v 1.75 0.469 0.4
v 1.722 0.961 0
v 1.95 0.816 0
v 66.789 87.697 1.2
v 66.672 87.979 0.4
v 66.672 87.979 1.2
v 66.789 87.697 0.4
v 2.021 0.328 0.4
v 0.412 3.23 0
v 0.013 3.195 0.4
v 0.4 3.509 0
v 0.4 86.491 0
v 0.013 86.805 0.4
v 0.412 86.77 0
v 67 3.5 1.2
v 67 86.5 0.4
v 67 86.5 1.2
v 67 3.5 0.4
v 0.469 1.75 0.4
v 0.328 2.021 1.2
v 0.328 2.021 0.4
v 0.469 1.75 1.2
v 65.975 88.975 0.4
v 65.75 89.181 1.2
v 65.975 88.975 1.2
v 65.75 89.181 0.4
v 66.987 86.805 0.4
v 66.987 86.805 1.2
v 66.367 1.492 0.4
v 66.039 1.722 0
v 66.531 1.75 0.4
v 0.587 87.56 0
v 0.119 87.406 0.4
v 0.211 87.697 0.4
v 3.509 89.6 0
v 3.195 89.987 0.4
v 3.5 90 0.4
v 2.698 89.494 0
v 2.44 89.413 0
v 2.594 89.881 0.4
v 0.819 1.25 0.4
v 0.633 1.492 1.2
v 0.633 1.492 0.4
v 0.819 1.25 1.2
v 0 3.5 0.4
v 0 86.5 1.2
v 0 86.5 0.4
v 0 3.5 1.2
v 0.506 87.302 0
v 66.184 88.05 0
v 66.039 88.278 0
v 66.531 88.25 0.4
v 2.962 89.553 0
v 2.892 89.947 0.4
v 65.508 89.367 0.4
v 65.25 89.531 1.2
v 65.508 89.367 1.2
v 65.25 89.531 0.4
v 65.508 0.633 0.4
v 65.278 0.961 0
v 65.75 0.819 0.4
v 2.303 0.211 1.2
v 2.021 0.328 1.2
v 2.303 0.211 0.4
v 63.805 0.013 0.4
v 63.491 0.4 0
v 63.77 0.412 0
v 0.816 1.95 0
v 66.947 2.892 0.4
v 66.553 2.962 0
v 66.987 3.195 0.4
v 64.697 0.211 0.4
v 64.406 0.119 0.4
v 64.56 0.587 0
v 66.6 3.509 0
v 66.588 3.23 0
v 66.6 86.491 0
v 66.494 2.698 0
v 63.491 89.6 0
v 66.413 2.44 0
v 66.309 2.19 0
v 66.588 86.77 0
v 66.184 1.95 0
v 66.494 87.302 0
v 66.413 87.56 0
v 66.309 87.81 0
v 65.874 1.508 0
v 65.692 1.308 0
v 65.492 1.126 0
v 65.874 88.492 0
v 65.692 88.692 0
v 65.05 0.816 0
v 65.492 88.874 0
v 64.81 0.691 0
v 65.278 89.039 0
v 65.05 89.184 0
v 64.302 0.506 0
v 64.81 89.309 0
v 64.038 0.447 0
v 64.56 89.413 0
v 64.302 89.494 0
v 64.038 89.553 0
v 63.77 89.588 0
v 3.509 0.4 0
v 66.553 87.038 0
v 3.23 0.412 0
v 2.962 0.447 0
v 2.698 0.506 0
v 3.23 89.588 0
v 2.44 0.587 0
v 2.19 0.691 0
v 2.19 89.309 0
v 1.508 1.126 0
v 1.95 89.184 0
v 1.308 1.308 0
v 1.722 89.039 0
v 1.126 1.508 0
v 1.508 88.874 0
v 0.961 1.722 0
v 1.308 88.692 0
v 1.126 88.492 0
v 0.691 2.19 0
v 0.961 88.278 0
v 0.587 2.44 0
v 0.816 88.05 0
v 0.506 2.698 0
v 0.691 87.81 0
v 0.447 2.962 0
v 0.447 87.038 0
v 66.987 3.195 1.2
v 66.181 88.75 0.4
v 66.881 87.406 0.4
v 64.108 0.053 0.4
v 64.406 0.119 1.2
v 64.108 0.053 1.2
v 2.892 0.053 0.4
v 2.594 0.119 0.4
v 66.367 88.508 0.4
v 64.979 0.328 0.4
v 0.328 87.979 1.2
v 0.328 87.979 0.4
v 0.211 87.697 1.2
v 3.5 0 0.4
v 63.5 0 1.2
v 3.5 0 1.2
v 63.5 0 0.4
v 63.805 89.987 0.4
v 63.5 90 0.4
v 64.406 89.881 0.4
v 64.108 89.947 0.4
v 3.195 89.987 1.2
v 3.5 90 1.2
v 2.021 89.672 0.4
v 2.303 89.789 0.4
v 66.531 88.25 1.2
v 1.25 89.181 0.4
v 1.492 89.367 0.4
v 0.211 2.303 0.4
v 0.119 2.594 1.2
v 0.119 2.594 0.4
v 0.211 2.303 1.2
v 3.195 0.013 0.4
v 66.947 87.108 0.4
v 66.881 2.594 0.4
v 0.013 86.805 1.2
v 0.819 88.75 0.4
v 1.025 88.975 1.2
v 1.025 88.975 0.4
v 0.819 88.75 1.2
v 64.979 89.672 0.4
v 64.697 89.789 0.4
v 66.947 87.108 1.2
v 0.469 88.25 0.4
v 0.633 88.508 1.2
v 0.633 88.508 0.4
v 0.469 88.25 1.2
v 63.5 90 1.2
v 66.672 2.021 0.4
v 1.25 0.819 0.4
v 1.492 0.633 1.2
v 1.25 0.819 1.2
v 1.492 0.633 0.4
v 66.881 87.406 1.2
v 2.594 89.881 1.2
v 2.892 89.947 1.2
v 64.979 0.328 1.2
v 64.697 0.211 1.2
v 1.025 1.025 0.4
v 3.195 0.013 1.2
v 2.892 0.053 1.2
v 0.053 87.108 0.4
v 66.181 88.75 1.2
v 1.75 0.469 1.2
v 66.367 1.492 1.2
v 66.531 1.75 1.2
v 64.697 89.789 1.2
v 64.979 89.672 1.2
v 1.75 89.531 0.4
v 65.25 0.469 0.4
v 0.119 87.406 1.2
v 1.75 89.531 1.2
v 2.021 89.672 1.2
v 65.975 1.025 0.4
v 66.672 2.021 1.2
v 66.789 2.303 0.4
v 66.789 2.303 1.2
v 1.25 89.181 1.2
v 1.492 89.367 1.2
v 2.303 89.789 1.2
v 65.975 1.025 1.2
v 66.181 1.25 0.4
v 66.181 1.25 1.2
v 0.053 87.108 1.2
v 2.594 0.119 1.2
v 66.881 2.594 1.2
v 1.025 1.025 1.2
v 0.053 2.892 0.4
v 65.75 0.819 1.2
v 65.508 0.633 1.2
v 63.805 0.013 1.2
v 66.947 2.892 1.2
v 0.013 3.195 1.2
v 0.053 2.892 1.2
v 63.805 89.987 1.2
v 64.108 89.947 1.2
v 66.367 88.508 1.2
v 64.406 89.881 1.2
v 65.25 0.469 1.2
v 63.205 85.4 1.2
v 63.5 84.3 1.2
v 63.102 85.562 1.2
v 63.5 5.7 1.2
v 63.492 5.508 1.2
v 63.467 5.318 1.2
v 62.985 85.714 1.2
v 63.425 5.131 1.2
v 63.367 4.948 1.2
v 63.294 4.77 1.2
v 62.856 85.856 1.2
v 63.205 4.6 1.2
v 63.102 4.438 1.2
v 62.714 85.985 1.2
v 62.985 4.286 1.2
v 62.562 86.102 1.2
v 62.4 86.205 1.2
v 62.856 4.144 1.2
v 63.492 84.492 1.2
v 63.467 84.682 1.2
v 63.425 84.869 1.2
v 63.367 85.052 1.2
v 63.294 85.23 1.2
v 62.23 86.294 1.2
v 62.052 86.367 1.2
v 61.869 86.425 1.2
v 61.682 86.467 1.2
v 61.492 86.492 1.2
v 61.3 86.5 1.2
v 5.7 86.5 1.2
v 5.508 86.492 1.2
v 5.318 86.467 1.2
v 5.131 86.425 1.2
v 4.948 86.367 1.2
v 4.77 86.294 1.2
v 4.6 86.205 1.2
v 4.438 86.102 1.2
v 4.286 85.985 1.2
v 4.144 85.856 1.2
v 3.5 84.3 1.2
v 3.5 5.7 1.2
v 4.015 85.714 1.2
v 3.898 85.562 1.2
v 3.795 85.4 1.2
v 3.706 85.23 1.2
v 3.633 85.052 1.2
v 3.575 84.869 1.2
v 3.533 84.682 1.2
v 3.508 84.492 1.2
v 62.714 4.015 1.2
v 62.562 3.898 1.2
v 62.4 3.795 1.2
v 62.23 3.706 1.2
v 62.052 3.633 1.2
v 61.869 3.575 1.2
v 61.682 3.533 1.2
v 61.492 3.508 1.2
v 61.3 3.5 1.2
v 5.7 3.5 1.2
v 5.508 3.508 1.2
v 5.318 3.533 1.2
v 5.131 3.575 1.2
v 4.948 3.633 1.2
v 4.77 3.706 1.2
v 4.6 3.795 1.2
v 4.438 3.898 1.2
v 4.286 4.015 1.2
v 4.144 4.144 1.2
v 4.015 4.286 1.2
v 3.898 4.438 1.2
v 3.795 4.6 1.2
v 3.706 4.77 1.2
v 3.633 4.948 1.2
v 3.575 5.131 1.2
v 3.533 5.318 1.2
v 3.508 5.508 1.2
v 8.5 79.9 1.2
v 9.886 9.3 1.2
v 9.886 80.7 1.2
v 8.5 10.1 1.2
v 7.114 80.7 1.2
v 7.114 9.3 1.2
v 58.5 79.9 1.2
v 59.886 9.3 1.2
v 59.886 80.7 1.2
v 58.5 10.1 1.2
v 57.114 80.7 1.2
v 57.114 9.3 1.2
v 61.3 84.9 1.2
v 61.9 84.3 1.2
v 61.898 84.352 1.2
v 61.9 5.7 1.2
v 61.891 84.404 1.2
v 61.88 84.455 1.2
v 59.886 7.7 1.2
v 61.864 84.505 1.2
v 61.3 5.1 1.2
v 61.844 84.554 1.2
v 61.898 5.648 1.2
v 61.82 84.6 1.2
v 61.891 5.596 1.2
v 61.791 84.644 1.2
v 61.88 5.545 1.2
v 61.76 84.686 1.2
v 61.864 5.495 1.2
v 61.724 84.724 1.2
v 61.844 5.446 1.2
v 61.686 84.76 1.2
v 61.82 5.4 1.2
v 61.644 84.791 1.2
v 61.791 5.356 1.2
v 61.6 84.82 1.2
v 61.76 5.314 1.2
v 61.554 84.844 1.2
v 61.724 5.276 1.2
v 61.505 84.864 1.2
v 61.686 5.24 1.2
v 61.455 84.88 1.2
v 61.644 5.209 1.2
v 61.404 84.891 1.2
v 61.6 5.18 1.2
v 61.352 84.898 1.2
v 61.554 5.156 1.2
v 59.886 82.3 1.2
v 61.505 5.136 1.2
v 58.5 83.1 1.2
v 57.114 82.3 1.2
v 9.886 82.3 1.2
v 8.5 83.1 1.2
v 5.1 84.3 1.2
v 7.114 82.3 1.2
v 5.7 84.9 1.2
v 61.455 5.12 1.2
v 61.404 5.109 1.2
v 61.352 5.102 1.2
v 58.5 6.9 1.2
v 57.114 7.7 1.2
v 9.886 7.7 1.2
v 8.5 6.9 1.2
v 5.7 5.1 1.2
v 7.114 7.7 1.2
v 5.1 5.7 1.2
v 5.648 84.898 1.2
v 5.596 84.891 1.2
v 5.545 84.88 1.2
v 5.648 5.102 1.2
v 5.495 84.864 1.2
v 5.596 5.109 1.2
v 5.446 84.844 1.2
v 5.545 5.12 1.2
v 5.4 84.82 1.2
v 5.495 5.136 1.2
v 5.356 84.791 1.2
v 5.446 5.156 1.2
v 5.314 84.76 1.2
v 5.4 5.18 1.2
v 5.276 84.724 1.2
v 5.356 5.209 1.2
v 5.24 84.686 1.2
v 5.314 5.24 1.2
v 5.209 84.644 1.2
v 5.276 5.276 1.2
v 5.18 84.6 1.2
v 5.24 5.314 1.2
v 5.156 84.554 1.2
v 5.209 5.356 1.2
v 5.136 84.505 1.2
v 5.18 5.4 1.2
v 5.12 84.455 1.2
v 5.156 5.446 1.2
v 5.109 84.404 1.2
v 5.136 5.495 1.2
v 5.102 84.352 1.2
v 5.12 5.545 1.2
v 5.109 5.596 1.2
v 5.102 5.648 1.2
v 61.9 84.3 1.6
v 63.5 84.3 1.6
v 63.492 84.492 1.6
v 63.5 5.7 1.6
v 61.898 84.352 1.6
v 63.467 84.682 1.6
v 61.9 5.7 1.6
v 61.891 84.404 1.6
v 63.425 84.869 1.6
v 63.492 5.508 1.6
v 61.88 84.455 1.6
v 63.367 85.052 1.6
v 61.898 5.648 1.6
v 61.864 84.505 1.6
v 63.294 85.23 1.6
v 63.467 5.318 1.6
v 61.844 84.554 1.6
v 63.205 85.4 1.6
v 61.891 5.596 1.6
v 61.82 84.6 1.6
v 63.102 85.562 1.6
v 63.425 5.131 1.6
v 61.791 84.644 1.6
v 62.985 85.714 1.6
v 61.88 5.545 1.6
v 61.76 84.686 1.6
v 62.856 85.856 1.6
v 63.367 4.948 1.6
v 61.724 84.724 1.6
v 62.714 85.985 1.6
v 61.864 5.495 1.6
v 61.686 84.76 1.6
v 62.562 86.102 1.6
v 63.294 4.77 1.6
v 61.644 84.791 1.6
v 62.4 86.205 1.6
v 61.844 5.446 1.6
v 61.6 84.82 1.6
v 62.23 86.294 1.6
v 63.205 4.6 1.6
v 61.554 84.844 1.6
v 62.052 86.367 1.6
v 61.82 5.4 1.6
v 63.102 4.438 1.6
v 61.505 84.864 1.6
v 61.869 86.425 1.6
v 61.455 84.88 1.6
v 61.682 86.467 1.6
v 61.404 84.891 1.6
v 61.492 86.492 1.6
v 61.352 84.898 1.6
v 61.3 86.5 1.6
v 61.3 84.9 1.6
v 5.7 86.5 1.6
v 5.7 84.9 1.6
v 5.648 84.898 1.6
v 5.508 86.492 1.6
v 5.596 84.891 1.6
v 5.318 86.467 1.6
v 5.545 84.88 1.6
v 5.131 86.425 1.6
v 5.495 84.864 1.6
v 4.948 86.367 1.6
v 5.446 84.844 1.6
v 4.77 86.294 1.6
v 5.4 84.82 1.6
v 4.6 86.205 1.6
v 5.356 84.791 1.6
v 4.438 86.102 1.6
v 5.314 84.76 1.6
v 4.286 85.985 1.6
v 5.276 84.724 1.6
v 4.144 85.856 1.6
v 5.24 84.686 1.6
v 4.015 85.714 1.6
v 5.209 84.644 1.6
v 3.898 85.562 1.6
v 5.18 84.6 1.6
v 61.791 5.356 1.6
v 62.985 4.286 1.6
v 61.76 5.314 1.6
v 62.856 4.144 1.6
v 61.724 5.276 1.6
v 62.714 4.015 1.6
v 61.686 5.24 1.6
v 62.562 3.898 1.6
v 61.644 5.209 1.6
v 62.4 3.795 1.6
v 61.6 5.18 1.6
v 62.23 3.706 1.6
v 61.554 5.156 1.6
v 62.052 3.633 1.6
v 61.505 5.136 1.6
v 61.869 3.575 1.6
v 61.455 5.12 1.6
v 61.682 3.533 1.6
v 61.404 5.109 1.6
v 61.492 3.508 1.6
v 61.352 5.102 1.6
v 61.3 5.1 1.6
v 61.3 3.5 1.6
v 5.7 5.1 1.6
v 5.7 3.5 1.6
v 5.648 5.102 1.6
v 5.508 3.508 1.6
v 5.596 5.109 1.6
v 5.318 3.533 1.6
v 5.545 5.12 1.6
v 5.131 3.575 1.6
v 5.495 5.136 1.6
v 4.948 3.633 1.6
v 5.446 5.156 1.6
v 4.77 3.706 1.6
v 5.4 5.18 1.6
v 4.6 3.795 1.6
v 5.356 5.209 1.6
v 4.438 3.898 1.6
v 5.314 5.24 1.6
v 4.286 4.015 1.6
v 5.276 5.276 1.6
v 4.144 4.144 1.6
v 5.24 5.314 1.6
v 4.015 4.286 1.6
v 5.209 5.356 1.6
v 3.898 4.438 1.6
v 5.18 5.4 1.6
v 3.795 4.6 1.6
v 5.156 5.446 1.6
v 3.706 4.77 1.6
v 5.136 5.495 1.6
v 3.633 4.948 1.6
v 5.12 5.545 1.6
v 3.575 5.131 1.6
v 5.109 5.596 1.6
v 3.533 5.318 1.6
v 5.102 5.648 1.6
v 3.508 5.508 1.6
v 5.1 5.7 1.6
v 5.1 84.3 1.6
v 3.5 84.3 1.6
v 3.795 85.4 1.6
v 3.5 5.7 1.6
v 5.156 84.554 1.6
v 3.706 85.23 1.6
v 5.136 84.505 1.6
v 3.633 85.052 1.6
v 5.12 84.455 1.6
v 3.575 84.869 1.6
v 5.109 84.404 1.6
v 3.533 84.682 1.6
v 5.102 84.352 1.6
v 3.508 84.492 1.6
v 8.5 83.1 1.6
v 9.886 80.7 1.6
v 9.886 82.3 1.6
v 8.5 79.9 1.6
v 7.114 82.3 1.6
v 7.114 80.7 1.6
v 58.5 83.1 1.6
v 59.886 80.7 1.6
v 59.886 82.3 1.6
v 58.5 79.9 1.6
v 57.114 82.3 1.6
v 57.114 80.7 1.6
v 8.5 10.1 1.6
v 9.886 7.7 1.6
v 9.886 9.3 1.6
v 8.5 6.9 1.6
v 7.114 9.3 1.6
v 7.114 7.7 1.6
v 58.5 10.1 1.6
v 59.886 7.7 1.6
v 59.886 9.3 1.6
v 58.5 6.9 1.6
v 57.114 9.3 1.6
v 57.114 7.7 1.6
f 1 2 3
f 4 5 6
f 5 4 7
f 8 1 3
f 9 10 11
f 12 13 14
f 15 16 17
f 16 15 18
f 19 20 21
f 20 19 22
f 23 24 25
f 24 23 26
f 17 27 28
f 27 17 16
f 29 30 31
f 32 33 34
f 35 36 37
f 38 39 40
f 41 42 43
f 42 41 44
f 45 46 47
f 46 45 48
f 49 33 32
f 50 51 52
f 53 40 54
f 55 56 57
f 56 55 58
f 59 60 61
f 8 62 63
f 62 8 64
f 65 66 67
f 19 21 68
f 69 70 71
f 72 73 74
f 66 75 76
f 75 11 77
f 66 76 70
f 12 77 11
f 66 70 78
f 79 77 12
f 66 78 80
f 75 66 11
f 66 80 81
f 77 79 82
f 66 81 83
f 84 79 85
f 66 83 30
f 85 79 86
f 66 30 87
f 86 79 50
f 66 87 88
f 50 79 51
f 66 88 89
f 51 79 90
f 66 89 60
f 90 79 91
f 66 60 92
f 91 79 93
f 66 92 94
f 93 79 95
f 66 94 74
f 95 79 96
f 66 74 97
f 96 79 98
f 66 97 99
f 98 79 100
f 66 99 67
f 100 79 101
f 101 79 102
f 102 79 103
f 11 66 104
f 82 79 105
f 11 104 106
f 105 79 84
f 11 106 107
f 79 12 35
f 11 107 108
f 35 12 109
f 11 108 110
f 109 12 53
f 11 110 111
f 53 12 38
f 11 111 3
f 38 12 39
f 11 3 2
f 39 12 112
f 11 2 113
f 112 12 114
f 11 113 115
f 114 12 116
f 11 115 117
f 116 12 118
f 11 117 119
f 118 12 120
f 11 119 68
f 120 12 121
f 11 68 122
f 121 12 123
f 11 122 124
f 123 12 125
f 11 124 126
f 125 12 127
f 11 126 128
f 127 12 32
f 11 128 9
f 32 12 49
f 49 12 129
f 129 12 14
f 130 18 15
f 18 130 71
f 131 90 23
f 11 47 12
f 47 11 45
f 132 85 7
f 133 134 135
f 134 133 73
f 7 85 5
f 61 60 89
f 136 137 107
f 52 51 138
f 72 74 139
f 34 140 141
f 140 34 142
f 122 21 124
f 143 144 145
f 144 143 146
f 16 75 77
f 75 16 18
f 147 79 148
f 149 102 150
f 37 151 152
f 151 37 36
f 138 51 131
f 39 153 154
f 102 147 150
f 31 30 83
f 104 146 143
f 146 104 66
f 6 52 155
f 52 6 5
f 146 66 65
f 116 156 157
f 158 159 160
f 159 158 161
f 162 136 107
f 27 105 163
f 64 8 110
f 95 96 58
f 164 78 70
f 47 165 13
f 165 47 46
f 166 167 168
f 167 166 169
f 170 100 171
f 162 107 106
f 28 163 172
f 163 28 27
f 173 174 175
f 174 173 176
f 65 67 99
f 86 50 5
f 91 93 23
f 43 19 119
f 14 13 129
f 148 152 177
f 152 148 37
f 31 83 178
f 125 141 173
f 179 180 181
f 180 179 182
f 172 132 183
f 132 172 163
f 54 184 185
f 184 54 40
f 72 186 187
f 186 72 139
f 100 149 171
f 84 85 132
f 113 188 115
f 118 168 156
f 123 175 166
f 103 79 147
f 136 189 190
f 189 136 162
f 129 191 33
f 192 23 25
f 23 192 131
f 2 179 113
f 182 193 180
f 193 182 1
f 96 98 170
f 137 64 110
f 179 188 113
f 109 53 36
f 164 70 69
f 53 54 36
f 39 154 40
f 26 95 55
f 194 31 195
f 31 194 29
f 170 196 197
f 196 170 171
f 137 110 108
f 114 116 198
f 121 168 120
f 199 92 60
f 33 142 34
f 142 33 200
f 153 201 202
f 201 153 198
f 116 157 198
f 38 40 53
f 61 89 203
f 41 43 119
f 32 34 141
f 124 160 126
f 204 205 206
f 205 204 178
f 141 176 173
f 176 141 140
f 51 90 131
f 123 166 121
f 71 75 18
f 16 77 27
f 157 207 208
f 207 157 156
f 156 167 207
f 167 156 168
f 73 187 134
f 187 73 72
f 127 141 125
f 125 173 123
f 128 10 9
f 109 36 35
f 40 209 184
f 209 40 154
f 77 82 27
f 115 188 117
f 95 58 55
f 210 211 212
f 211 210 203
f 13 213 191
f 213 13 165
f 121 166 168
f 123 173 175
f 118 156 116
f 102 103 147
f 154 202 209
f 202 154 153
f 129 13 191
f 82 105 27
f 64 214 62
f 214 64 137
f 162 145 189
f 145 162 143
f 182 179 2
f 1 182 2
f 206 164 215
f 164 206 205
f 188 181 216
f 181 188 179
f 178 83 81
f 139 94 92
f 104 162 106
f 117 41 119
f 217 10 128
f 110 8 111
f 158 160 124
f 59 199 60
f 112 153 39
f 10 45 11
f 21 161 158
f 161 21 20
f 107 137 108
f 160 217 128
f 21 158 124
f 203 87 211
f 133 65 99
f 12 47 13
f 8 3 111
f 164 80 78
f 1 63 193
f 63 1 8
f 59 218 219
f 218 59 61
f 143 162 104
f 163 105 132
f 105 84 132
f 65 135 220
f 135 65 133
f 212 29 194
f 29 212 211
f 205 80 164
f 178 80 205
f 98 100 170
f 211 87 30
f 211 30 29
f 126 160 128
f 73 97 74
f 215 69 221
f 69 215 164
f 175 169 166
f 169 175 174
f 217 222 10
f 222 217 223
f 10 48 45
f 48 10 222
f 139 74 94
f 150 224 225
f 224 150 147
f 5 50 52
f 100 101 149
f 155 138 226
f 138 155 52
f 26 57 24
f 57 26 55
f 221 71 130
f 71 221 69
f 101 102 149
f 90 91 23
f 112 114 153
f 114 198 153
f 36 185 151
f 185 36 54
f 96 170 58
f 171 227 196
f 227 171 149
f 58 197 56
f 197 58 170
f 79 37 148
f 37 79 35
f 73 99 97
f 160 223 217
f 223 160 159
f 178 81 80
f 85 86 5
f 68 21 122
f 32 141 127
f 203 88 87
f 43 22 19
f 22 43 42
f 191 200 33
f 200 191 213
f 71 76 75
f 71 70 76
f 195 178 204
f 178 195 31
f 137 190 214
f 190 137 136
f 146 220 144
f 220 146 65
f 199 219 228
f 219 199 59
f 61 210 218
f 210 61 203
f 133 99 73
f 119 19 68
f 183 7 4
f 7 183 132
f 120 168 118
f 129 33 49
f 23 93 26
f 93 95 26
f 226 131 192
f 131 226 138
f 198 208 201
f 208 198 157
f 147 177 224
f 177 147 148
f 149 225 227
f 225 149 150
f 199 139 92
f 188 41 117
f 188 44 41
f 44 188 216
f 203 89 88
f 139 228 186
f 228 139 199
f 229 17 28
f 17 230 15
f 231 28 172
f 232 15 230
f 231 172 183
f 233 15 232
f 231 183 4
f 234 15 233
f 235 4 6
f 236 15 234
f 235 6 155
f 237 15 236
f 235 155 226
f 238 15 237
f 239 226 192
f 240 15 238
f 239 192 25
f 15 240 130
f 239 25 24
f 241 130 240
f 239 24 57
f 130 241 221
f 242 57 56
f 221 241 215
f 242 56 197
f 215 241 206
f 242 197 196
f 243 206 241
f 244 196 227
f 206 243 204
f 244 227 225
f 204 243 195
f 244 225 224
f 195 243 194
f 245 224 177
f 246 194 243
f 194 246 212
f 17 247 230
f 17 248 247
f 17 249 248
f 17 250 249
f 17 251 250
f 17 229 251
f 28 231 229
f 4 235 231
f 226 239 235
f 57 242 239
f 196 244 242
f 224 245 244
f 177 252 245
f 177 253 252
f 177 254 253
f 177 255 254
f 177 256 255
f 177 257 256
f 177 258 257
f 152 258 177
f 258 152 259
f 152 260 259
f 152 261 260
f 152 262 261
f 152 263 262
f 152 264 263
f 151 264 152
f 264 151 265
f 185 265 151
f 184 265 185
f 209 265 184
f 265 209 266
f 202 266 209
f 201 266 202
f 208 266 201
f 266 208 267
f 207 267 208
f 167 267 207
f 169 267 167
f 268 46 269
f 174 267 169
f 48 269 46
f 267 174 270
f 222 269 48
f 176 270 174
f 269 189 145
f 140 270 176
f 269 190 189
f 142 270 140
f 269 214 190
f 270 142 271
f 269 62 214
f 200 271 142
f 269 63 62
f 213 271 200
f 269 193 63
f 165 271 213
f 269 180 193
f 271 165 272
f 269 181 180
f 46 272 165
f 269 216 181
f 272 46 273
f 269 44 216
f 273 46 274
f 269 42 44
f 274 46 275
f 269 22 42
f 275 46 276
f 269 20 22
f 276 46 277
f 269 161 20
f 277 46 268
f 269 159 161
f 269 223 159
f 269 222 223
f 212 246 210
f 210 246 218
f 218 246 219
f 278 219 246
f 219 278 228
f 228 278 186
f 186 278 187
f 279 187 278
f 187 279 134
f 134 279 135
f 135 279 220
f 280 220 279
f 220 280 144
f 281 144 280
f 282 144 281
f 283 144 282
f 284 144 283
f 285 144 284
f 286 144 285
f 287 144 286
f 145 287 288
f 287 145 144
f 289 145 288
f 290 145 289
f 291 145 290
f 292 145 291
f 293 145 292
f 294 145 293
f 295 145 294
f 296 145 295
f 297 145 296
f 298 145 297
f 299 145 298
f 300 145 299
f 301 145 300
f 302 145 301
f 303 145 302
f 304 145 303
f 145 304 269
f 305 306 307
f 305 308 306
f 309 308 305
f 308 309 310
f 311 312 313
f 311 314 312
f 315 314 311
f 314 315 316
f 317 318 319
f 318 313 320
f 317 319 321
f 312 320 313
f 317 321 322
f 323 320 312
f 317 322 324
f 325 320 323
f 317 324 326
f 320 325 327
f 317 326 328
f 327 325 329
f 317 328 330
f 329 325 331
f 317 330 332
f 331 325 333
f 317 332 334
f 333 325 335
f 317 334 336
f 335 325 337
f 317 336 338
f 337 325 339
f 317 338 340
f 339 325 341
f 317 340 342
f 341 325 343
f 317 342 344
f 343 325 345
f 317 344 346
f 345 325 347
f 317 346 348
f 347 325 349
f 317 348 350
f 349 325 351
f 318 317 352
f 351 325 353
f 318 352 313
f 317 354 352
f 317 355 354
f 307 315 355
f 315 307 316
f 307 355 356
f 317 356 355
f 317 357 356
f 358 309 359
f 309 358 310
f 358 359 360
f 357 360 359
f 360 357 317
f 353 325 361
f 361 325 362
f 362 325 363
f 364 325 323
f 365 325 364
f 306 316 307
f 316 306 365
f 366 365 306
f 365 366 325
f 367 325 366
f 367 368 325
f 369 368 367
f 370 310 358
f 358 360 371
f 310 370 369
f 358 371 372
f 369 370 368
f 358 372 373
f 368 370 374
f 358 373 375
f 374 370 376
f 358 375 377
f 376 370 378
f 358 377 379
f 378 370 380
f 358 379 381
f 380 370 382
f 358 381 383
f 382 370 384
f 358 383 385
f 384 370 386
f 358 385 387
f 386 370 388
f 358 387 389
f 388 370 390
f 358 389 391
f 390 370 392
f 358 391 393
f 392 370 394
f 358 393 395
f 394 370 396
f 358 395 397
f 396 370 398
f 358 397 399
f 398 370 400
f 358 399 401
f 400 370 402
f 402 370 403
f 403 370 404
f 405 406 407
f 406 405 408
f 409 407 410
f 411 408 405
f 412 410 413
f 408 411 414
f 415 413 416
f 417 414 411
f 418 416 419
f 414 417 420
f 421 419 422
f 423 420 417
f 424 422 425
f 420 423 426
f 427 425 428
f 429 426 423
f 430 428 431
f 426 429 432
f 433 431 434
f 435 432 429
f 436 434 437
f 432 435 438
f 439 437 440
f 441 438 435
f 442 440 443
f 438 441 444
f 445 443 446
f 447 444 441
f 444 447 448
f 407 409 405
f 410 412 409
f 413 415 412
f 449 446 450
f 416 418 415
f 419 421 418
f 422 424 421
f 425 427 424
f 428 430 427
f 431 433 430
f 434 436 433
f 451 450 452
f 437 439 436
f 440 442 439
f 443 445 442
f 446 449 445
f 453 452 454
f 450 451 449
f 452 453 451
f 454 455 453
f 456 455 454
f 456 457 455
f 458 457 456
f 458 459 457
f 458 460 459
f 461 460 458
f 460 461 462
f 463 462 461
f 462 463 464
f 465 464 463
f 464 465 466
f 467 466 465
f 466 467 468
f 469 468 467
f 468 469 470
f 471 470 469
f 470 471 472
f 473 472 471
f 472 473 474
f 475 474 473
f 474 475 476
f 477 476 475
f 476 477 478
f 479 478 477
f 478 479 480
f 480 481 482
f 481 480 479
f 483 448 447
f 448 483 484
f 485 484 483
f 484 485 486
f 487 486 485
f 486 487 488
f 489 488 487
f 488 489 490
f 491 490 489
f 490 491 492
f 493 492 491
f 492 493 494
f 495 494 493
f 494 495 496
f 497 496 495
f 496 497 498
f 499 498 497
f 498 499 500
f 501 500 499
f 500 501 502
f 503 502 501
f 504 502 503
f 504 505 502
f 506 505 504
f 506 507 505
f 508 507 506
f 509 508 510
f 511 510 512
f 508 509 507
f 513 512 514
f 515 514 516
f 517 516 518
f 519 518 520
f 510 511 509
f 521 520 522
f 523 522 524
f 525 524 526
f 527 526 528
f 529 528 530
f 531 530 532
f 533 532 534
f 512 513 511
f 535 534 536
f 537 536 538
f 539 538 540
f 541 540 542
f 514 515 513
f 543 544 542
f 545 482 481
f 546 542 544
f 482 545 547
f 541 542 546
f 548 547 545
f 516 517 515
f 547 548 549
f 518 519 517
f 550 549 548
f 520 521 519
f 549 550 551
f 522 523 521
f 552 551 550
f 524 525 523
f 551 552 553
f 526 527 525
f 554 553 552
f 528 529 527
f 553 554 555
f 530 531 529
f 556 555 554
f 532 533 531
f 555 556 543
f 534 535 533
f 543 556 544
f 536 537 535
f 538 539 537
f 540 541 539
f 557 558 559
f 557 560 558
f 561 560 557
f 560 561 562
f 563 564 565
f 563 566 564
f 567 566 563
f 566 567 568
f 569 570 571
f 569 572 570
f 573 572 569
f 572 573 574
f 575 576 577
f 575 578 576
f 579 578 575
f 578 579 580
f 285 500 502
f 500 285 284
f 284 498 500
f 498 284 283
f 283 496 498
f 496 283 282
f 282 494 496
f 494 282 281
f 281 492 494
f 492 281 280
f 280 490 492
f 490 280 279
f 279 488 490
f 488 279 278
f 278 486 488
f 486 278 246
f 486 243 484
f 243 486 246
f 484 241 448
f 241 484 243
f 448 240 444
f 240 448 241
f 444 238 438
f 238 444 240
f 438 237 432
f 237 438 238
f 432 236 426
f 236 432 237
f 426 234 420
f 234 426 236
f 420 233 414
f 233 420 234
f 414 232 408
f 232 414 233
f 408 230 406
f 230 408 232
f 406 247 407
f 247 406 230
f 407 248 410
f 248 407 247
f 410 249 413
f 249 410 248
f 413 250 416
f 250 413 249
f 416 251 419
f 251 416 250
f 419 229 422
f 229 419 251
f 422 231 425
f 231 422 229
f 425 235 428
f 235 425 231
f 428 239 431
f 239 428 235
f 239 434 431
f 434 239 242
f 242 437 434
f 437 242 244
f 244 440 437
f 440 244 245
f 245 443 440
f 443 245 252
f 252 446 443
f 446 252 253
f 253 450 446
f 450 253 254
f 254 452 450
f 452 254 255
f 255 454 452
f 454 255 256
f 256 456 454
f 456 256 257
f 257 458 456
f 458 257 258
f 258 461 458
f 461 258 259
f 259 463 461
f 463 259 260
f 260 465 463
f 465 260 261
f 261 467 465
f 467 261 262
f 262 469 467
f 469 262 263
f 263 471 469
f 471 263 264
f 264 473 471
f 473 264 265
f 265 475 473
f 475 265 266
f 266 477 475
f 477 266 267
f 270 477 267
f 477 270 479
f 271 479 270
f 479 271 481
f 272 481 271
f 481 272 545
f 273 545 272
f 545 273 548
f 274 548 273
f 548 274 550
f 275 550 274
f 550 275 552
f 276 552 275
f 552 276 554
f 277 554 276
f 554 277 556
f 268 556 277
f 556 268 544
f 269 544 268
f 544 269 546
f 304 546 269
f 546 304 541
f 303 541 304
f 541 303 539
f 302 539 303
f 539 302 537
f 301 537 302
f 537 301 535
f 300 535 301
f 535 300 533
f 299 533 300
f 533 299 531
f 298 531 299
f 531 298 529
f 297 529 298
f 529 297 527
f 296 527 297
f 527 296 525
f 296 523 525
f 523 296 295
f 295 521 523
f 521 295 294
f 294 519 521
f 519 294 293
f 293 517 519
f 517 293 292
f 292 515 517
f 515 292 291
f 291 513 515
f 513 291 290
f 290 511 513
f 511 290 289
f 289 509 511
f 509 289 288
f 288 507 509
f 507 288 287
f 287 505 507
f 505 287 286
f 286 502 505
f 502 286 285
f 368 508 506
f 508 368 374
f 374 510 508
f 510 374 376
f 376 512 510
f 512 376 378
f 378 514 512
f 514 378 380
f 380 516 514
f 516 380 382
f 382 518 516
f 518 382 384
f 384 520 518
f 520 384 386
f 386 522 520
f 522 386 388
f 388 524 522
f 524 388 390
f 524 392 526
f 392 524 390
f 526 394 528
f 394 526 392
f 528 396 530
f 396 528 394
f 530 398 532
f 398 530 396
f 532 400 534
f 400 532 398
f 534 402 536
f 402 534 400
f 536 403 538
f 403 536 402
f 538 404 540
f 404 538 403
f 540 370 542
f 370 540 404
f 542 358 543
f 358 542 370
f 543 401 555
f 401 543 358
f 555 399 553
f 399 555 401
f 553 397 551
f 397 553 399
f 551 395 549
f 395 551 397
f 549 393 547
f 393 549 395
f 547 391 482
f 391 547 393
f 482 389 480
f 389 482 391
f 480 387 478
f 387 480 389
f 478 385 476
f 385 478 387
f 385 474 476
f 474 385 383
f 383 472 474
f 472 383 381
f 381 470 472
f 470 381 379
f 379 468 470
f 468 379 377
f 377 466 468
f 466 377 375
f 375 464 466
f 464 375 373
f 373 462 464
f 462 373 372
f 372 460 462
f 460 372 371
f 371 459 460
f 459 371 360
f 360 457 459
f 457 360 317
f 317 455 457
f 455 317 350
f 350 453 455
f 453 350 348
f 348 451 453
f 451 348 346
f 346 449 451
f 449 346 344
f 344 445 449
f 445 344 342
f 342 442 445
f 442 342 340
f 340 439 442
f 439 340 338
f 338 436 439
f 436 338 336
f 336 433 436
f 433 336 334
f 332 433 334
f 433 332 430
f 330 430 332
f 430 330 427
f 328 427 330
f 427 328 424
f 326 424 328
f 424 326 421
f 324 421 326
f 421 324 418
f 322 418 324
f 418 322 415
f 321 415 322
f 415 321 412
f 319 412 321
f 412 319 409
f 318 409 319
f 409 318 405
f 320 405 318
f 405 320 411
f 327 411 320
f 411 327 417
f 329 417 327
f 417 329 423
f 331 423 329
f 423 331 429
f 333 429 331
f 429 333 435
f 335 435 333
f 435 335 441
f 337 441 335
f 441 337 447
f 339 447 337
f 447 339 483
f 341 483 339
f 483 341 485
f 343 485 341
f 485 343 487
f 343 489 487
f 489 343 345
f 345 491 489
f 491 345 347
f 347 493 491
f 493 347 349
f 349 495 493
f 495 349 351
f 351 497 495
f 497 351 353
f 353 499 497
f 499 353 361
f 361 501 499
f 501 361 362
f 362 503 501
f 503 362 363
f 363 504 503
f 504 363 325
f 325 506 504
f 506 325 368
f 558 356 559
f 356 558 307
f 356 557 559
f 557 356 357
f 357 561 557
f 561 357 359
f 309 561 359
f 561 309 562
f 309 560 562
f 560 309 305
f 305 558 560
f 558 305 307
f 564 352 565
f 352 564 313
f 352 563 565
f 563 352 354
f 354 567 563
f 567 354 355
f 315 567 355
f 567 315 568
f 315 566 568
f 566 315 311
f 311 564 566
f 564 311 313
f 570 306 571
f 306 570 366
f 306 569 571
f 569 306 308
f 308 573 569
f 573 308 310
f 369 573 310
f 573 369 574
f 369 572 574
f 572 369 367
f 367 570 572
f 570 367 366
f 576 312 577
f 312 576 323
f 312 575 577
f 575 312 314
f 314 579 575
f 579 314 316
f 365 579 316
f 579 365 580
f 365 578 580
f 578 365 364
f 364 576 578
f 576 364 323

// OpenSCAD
// armarouge-card-2cores-01.scad
// Card tapa-buraco do Armarouge, 67 x 90mm, SEM NOME E SEM NUMERO e em DUAS
// CORES no IFS: fundo CINZA CLARO (filamento 1) e moldura + figura PRETAS
// (filamento 2). Derivado do cartoes/pokemon-filler-card-01, que e' a versao
// com texto e 4 cores -- as medidas do bolso do album e a espessura vem de la
// (67x90 de proposito MAIOR que o card oficial de 63x88, corpo de 1.2mm =
// 6 camadas a 0.20mm, total acabado 2.0mm, a mesma espessura que ja foi
// impressa e provada no pokemon-coin-binder-01).
//
// O que muda em relacao ao 01:
//   - labels_2d() saiu: sem "ARMAROUGE", sem "#936".
//   - band_h = 0: a faixa que existia so pra abrigar o texto virou area util,
//     entao a arte cresce de 38.3 x 62.8 para 45.7 x 74.8mm.
//   - so 2 grupos de cor, e o corte sai do NIVEL DO RELEVO, nao da matiz:
//     k-means em RGB separaria amarelo de vermelho, duas cores igualmente
//     claras que em preto/cinza viram uma mancha chapada so (testado, a
//     figura sumiu). Como o svg2relief converteu luminancia em ALTURA, o
//     nivel do relevo E' o tom -- quem faz esse corte e' o art2parts.py.
//
// Imprime com o verso na mesa e o relevo pra cima, uma peca, sem suporte.
// Chanfro de 0.4mm na aresta de baixo mata o pe de elefante. BRIM recomendado:
// placa de 67x90 com 1.2mm de corpo e' geometria classica de empeno.
//
// Escalas ja conferidas nesta maquina (ver cabecalho do 01, nao rechutar):
//   surface() de PNG: cinza 0 -> z 0, cinza 255 -> z 100; 1 px = 1 unidade XY.
//   O contrato de cinza (fundo em z100=20) esta no svg2relief.py.
//
// Exports canonicos (Flatpak, caminhos ABSOLUTOS a partir da pasta do modelo):
//   flatpak run org.openscad.OpenSCAD -o stl/armarouge-card-2cores-01-body.stl -D 'part="body"' armarouge-card-2cores-01.scad
//   flatpak run org.openscad.OpenSCAD -o stl/armarouge-card-2cores-01-trim.stl -D 'part="trim"' armarouge-card-2cores-01.scad
//   o heightmap sai do svg2relief.py, as duas malhas de ARTE saem do
//   art2parts.py (corte por nivel) e o 3MF de 2 filamentos, do
//   multicolor3mf.py. Linhas de comando exatas no README.

/* [Peca a renderizar] */
// "card"  peca inteira em cor unica, so pra PREVIEW/render
// "plate" chapa de cards inteiros, so pra conferir footprint
// "body"  corpo liso do card -- peca do filamento 1 (CINZA CLARO)
// "trim"  moldura + hexagonos -- peca do filamento 2 (PRETO)
part = "card"; // "card" | "plate" | "body" | "trim"

/* [Cartao] */
card_w = 67.0;
card_h = 90.0;
card_t = 1.20;
corner_r = 3.50;
foot_chamfer = 0.40;

/* [Arte] */
art_src = "relief";                 // "relief" | "none"
relief_png = "art/armarouge.png";   // heightmap do svg2relief.py
relief_max = 0.80;   // mm acima da face do card
relief_bury = 0.05;  // mm de plato de fundo enterrado
png_w = 128;         // px, conferir com o arquivo
png_h = 209;         // px
art_flip_y = false;
art_dx = 0;
art_dy = 0;

/* [Moldura] */
relief_h = 0.40;    // mm de alto relevo da moldura e dos hexagonos
frame_inset = 3.5;
frame_w = 1.6;
frame_r = 2.2;
band_h = 0.0;       // 0 = sem faixa de texto; a arte ocupa o card todo
hex_mark = 3.2;

/* [Chapa] */
plate_cols = 2;
plate_rows = 2;
plate_gap = 4.0;

/* [Qualidade] */
$fn = 72;
eps = 0.02;

// ---------------------------------------------------------------------
win_x0 = frame_inset + frame_w + 2.5;
win_w = card_w - 2 * win_x0;
win_y0 = frame_inset + frame_w + 2.5 + band_h;
win_y1 = card_h - (frame_inset + frame_w + 2.5);
win_h = win_y1 - win_y0;
win_cx = card_w / 2;
win_cy = (win_y0 + win_y1) / 2;

png_aspect = (png_w - 1) / (png_h - 1);
art_h = min(win_h, win_w / png_aspect);
art_w = art_h * png_aspect;

Z100_BG = 20;
Z100_TOP = 100;
zscale = (relief_max + relief_bury) / (Z100_TOP - Z100_BG);
relief_z0 = card_t - relief_bury - Z100_BG * zscale;
surface_floor = relief_z0 - zscale;

total_t = card_t + max(relief_max, relief_h);
plate_w = plate_cols * card_w + (plate_cols - 1) * plate_gap;
plate_h = plate_rows * card_h + (plate_rows - 1) * plate_gap;

assert(card_t >= 1.0, "card_t abaixo de 1mm nao sai solido em FDM");
assert(win_w > 20 && win_h > 20, "Janela de arte pequena demais");
assert(foot_chamfer < card_t, "foot_chamfer precisa ser menor que card_t");
assert(surface_floor > 0.05, "O heightmap furaria o verso do card");
assert(art_w <= win_w + eps && art_h <= win_h + eps, "Arte estourou a janela");

echo(str("armarouge-card-2cores-01: card ", card_w, " x ", card_h,
         " mm, corpo ", card_t, " mm, acabado ", total_t, " mm"));
echo(str("  janela de arte: ", win_w, " x ", win_h, " mm, centro em [",
         win_cx, ", ", win_cy, "]"));
echo(str("  arte encaixada: ", art_w, " x ", art_h, " mm (heightmap ",
         png_w, "x", png_h, " px, ", art_w / (png_w - 1), " mm/px)"));
echo(str("  z0 do surface em ", relief_z0, " mm | piso do solido em ",
         surface_floor, " mm (tem que ser > 0)"));
echo(str("  chapa ", plate_cols, "x", plate_rows, " = ", plate_cols * plate_rows,
         " cards, footprint ", plate_w, " x ", plate_h, " mm"));

// ---------------------------------------------------------------------
module card_outline_2d(inset = 0) {
    translate([corner_r, corner_r])
        offset(r = -inset) offset(r = corner_r)
            square([card_w - 2 * corner_r, card_h - 2 * corner_r]);
}

// Retangulo arredondado ANCORADO: o translate soma o raio de proposito,
// senao offset(r) desloca a forma r pra esquerda e pra baixo (bug da v1 do 01).
module rrect_2d(x, y, w, h, r) {
    translate([x + r, y + r]) offset(r = r) square([w - 2 * r, h - 2 * r]);
}

module frame_2d() {
    difference() {
        rrect_2d(frame_inset, frame_inset,
                 card_w - 2 * frame_inset, card_h - 2 * frame_inset, frame_r);
        rrect_2d(frame_inset + frame_w, frame_inset + frame_w,
                 card_w - 2 * (frame_inset + frame_w),
                 card_h - 2 * (frame_inset + frame_w),
                 max(0.1, frame_r - frame_w));
    }
}

module hex_marks_2d() {
    m = frame_inset + frame_w + 3.4;
    for (x = [m, card_w - m], y = [m, card_h - m])
        translate([x, y]) rotate([0, 0, 30]) circle(d = hex_mark, $fn = 6);
}

module relief_2d() { frame_2d(); hex_marks_2d(); }

module card_body() {
    hull() {
        linear_extrude(eps) card_outline_2d(foot_chamfer);
        translate([0, 0, foot_chamfer]) linear_extrude(eps) card_outline_2d();
    }
    translate([0, 0, foot_chamfer])
        linear_extrude(card_t - foot_chamfer) card_outline_2d();
}

module trim() {
    translate([0, 0, card_t - eps]) linear_extrude(relief_h + eps) relief_2d();
}

module art_relief() {
    translate([win_cx + art_dx, win_cy + art_dy, relief_z0])
        mirror([0, art_flip_y ? 1 : 0, 0])
            scale([art_w / (png_w - 1), art_h / (png_h - 1), zscale])
                translate([-(png_w - 1) / 2, -(png_h - 1) / 2, 0])
                    surface(file = relief_png, center = false, invert = false);
}

module card() {
    union() {
        card_body();
        trim();
        if (art_src == "relief") art_relief();
    }
}

module plate() {
    for (c = [0 : plate_cols - 1], r = [0 : plate_rows - 1])
        translate([c * (card_w + plate_gap), r * (card_h + plate_gap), 0]) card();
}

// ---------------------------------------------------------------------
if (part == "card") card();
else if (part == "plate") plate();
else if (part == "body") card_body();
else if (part == "trim") trim();
else assert(false, "part invalido: card | plate | body | trim");
